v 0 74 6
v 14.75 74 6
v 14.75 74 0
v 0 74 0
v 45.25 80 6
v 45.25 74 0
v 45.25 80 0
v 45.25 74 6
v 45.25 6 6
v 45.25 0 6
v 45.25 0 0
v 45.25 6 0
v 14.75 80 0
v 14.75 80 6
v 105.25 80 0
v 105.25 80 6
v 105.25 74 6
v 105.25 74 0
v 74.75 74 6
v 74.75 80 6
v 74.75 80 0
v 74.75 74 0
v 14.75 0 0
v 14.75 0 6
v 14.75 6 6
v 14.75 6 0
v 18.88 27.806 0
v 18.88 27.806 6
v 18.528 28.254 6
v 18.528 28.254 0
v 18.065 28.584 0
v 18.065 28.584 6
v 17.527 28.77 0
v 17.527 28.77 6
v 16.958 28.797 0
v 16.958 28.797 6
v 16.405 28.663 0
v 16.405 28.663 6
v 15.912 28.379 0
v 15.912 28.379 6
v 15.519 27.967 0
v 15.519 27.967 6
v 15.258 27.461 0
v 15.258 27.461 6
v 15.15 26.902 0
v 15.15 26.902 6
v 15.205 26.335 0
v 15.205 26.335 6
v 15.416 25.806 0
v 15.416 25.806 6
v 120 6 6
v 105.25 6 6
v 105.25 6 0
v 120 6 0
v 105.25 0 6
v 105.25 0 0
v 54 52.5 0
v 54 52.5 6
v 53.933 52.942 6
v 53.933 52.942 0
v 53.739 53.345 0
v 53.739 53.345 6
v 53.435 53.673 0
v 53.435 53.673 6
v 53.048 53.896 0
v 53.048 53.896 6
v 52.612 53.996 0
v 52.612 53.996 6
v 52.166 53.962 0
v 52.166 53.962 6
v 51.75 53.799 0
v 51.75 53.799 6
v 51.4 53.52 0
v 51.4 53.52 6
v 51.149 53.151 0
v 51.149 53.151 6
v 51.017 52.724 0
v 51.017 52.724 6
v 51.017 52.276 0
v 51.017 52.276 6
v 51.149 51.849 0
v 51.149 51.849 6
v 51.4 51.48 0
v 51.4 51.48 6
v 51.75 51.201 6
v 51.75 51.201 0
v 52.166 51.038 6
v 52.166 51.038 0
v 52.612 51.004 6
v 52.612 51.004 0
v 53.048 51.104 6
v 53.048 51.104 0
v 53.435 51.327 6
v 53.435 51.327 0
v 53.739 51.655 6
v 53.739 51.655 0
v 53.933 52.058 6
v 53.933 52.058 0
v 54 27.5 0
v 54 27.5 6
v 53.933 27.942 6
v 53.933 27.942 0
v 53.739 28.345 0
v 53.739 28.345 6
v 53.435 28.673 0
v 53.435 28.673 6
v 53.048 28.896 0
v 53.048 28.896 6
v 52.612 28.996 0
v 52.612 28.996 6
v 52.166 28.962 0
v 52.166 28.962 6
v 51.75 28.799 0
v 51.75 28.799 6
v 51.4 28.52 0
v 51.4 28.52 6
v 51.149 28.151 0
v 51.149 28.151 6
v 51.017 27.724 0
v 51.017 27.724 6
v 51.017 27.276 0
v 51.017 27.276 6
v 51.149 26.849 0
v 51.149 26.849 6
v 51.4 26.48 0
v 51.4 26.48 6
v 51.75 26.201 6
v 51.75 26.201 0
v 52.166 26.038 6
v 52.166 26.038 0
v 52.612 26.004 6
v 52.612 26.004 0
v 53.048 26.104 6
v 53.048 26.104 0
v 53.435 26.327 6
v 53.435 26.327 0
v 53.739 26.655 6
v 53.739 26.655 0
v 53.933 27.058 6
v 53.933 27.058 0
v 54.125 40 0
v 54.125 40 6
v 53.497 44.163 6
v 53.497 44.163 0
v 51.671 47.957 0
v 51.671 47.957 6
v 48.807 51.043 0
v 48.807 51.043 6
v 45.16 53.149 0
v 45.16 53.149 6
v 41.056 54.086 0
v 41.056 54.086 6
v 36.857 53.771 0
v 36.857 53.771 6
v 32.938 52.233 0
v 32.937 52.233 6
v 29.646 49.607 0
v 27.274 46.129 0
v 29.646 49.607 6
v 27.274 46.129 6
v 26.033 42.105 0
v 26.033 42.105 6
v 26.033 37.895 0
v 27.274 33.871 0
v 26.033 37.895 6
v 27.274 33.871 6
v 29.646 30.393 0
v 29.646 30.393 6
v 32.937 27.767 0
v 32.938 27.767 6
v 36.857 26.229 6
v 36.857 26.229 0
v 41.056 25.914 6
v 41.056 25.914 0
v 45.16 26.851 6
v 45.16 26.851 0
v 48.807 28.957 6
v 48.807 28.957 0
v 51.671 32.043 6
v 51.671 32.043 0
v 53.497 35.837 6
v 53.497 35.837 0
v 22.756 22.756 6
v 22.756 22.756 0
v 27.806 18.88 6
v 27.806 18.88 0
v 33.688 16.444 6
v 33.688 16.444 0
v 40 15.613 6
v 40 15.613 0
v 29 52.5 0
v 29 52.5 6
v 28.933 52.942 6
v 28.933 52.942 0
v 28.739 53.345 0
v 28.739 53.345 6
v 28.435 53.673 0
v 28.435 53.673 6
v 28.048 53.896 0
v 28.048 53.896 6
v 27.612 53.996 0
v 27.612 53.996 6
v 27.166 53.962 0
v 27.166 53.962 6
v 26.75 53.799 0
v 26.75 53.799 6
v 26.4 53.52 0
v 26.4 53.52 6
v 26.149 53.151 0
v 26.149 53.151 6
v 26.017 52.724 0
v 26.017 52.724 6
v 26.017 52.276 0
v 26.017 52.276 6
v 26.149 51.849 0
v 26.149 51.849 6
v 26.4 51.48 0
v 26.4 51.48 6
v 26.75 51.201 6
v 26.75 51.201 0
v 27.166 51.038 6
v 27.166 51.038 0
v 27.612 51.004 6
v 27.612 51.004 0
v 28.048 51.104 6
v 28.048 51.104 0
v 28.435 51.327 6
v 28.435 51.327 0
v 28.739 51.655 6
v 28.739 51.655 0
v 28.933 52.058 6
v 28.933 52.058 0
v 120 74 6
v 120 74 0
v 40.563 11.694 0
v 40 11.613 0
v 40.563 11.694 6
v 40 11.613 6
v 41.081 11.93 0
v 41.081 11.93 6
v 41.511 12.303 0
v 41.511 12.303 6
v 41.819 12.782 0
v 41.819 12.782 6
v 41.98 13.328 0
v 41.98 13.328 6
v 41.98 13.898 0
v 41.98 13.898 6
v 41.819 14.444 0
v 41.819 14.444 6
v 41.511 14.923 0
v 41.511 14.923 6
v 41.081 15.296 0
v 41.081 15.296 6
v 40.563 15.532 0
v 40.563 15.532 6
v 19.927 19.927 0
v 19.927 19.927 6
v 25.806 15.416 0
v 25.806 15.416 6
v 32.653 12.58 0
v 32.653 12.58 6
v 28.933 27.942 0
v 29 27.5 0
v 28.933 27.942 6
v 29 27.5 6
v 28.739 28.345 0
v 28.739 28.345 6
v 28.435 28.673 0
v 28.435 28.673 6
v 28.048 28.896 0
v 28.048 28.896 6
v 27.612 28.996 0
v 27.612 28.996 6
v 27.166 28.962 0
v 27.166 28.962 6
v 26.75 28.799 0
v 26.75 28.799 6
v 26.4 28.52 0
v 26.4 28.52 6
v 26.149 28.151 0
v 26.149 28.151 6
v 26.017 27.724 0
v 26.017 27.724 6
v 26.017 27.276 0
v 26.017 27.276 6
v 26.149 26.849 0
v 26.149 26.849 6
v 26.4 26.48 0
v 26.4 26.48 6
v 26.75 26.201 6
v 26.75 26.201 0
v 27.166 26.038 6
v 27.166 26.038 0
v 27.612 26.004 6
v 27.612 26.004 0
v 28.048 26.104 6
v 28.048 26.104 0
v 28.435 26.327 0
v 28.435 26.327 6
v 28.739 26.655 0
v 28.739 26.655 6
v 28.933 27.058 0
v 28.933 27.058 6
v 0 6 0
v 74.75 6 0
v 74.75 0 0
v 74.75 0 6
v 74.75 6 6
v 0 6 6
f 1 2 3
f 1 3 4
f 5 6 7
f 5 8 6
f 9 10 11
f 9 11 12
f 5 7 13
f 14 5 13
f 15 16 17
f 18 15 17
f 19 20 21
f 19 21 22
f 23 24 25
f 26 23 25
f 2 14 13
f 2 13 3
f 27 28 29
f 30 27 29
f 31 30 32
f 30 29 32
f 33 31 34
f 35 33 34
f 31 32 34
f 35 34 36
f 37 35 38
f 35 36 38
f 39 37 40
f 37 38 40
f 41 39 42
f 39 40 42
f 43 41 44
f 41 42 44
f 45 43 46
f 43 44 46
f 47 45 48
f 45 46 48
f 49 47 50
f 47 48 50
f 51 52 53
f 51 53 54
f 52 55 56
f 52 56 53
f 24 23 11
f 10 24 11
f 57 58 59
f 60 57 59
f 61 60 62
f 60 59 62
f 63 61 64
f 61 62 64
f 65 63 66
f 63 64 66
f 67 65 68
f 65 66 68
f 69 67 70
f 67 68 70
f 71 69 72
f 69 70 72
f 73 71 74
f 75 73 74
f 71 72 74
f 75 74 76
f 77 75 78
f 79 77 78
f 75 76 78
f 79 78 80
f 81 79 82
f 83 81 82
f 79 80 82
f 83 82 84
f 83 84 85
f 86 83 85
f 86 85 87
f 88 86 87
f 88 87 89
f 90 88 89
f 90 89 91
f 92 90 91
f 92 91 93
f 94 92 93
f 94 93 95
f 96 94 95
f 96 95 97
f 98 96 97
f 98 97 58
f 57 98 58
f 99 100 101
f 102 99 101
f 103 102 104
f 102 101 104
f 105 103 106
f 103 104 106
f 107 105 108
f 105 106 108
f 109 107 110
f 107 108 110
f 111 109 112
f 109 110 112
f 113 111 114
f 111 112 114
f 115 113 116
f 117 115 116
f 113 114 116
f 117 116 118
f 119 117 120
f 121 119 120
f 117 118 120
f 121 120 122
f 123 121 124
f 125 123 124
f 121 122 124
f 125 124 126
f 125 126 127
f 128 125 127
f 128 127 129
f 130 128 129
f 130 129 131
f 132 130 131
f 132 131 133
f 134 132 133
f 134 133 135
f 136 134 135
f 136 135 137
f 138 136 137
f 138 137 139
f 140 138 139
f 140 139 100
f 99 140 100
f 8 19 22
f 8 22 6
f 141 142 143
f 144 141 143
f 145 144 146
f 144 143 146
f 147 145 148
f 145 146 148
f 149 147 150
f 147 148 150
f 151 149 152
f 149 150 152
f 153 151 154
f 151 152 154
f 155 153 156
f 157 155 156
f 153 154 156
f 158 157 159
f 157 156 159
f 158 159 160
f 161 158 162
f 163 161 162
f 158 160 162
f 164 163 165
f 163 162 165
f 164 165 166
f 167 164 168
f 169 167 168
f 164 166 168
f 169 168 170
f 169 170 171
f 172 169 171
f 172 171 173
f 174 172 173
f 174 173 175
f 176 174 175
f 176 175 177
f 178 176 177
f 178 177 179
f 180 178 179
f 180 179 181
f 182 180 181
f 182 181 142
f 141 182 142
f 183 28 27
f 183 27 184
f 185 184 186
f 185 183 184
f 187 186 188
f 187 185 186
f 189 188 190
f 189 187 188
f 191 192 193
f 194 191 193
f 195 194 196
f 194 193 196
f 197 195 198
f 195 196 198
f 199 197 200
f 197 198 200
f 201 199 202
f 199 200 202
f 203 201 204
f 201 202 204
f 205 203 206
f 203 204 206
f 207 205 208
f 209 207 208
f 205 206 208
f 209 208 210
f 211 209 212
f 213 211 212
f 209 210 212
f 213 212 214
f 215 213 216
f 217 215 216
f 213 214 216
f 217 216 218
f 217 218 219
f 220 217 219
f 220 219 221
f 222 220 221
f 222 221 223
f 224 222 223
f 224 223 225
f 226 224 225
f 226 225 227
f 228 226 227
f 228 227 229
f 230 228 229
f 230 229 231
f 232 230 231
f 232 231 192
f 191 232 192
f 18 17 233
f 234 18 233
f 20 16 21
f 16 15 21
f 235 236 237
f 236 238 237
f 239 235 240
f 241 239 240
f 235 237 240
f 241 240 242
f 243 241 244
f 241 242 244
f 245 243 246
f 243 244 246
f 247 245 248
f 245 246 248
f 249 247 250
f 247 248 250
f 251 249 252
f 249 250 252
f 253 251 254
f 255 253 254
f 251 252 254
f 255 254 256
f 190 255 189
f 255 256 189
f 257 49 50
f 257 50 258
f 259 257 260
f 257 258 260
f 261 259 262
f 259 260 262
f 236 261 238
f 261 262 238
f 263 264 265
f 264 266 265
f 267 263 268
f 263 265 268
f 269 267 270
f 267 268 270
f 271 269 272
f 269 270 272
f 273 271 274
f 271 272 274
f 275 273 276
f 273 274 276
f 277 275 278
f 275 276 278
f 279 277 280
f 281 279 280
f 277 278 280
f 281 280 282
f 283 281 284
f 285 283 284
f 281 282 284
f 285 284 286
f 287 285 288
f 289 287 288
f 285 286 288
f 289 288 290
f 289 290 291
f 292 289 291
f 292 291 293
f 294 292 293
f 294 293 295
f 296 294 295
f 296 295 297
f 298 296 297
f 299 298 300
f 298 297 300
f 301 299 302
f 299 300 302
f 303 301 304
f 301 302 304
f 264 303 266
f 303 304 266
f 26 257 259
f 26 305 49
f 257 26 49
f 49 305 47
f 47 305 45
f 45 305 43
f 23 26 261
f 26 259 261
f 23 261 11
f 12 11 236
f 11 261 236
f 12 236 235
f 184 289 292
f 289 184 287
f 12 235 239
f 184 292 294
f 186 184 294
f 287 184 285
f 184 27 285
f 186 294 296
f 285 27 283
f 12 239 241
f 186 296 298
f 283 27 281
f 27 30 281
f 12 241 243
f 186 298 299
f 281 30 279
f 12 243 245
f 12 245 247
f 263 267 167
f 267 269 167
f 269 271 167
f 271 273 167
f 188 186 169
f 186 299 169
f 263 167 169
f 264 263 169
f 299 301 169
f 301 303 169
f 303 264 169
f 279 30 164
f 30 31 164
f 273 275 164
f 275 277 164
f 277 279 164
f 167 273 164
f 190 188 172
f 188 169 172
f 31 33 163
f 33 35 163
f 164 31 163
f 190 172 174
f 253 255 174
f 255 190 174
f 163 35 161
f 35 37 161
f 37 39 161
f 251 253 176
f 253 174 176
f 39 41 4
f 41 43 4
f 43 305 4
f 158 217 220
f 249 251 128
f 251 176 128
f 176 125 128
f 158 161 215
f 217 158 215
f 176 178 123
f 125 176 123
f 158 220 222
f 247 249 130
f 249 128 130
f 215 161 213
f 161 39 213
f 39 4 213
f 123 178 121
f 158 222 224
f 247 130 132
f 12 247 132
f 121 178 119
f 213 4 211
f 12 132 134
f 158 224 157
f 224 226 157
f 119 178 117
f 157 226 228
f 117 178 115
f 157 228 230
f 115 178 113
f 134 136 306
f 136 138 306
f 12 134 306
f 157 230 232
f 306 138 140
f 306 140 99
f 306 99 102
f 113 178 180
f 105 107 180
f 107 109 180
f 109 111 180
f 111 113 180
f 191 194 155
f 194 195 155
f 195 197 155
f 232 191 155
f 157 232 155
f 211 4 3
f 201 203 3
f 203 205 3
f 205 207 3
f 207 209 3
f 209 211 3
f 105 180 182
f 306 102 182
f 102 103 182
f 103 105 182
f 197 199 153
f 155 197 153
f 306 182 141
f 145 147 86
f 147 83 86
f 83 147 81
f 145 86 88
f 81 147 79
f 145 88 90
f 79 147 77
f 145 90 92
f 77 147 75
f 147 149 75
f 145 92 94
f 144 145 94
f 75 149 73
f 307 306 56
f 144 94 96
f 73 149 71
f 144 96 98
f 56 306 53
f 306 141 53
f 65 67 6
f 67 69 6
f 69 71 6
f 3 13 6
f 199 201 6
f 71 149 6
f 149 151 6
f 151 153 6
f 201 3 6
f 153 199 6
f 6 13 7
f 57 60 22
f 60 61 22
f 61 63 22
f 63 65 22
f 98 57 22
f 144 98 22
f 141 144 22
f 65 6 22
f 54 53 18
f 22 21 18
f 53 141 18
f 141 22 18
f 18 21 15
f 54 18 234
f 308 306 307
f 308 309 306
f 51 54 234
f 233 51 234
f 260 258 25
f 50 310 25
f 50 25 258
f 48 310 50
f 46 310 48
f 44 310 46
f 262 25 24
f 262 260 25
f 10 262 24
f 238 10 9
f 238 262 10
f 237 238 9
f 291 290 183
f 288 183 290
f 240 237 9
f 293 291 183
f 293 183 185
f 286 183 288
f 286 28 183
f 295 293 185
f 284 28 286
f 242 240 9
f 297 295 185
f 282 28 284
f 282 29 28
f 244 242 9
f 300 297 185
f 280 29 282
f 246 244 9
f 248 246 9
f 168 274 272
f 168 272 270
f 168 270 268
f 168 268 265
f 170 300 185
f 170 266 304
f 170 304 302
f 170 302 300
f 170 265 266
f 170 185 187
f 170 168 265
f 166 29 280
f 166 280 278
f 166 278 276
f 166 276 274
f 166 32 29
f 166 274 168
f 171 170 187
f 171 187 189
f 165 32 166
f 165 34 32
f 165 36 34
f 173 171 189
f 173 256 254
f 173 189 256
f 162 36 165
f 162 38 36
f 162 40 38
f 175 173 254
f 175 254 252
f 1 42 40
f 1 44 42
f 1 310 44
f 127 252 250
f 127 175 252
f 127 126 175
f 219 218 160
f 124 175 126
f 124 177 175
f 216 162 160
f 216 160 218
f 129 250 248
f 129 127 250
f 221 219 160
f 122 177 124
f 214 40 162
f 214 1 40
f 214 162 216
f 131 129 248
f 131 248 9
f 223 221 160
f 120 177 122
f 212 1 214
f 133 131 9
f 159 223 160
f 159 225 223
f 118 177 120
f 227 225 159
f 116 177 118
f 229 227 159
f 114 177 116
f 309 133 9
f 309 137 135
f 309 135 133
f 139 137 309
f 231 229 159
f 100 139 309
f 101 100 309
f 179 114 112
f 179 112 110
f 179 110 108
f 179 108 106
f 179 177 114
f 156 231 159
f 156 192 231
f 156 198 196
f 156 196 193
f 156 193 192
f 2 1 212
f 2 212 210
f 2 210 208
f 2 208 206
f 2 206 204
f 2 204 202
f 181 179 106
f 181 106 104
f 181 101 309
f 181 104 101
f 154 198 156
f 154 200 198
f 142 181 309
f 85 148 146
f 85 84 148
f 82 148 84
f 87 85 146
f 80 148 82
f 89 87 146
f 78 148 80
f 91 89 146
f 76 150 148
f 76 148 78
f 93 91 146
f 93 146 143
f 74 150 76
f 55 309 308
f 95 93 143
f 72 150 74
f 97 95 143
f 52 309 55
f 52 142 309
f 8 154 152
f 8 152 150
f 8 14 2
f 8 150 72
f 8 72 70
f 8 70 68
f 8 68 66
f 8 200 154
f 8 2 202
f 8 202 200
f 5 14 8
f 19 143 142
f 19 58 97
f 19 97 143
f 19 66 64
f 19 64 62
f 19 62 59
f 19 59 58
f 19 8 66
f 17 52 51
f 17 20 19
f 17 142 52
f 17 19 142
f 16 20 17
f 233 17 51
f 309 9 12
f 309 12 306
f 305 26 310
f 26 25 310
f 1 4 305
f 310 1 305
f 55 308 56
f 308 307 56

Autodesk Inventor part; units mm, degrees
ref_plane "YZ Plane" through (0, 0, 0) normal (1, 0, 0) x (0, 1, 0)
ref_plane "XZ Plane" through (0, 0, 0) normal (0, 1, 0) x (-1, 0, 0)
ref_plane "XY Plane" through (0, 0, 0) normal (0, 0, 1) x (1, 0, 0)
sketch "Sketch1" plane through (0, 0, 0) normal (0, 0, 1) x (1, 0, 0)
  line L0 (0, 0) -> (120, 0)
  line L1 (120, 0) -> (120, 80)
  line L2 (120, 80) -> (0, 80)
  line L3 (0, 80) -> (0, 0)
  dimension "d0" = 120
  dimension "d1" = 80
extrude "Extrusion1" add sketch "Sketch1" along normal blind 6
sketch "Sketch2" plane through (0, 0, 6) normal (0, 0, 1) x (1, 0, 0)
  line L0 (0, 0) -> (120, 0) projected
  line L1 (120, 0) -> (120, 80) projected
  line L2 (120, 80) -> (0, 80) projected
  line L3 (0, 80) -> (0, 0) projected
  line L4 (0, 80) -> (14.75, 80)
  line L5 (14.75, 80) -> (14.75, 74)
  line L6 (14.75, 74) -> (0, 74)
  line L7 (0, 74) -> (0, 80)
  line L8 (120, 80) -> (0, 80) projected
  line L9 (45.25, 80) -> (74.75, 80)
  line L10 (74.75, 80) -> (74.75, 74)
  line L11 (74.75, 74) -> (45.25, 74)
  line L12 (45.25, 74) -> (45.25, 80)
  line L13 (120, 80) -> (105.25, 80)
  line L14 (105.25, 80) -> (105.25, 74)
  line L15 (105.25, 74) -> (120, 74)
  line L16 (120, 74) -> (120, 80)
  line L17 (120, 0) -> (105.25, 0)
  line L18 (105.25, 0) -> (105.25, 6)
  line L19 (105.25, 6) -> (120, 6)
  line L20 (120, 6) -> (120, 0)
  line L21 (0, 0) -> (120, 0) projected
  line L22 (74.75, 0) -> (45.25, 0)
  line L23 (45.25, 0) -> (45.25, 6)
  line L24 (45.25, 6) -> (74.75, 6)
  line L25 (74.75, 6) -> (74.75, 0)
  line L26 (0, 0) -> (14.75, 0)
  line L27 (14.75, 0) -> (14.75, 6)
  line L28 (14.75, 6) -> (0, 6)
  line L29 (0, 6) -> (0, 0)
  line L30 (60, 104.1502) -> (60, -33.6862)
  line L31 (120, 0) -> (120, 80) projected
  dimension "d4" = 6
  dimension "d5" = 6
  dimension "d6" = 14.75
  dimension "d7" = 29.5
  dimension "d9" = 14.75
  dimension "d19" = 60
  dimension "d20" = 14.75
extrude "Extrusion2" cut sketch "Sketch2" against normal up to next contours L3 L28 L27 L0 | L23 L24 L30 L0 | L3 L2 L5 L6 | L30 L24 L25 L0 | L18 L19 L1 L0 | L30 L2 L10 L11 | L11 L12 L2 L30 | L15 L14 L2 L1
sketch "Sketch4" plane through (0, 0, 6) normal (0, 0, 1) x (1, 0, 0)
  circle A0 centre (40, 40) radius 4.6
  line L0 (0, 74) -> (0, 6) projected
  line L1 (45.25, 80) -> (14.75, 80) projected
  point P0 (0, 0)
  dimension "d14" = 40
  dimension "d15" = 40
  dimension "d16" = 9.2
extrude "Extrusion4" cut sketch "Sketch4" against normal up to next
sketch "Sketch5" plane through (0, 0, 6) normal (0, 0, 1) x (1, 0, 0)
  circle A0 centre (40, 40) radius 4.6 projected
  line L0 (74.75, 6) -> (74.75, 0) projected
  line L1 (74.75, 0) -> (105.25, 0) projected
  line L2 (105.25, 0) -> (105.25, 6) projected
  line L3 (105.25, 6) -> (120, 6) projected
  line L4 (120, 6) -> (120, 74) projected
  line L5 (120, 74) -> (105.25, 74) projected
  line L6 (105.25, 74) -> (105.25, 80) projected
  line L7 (105.25, 80) -> (74.75, 80) projected
  line L8 (74.75, 80) -> (74.75, 74) projected
  line L9 (74.75, 74) -> (45.25, 74) projected
  line L10 (45.25, 74) -> (45.25, 80) projected
  line L11 (45.25, 80) -> (14.75, 80) projected
  line L12 (14.75, 80) -> (14.75, 74) projected
  line L13 (14.75, 74) -> (0, 74) projected
  line L14 (0, 74) -> (0, 6) projected
  line L15 (0, 6) -> (14.75, 6) projected
  line L16 (14.75, 6) -> (14.75, 0) projected
  line L17 (14.75, 0) -> (45.25, 0) projected
  line L18 (45.25, 0) -> (45.25, 6) projected
  line L19 (45.25, 6) -> (74.75, 6) projected
  line L20 (52.5, 27.5) -> (27.5, 27.5)
  line L21 (27.5, 27.5) -> (27.5, 52.5)
  line L22 (27.5, 52.5) -> (52.5, 52.5)
  line L23 (52.5, 52.5) -> (52.5, 27.5)
  circle A1 centre (40, 40) radius 14.125
  circle A2 centre (52.5, 27.5) radius 1.5
  circle A3 centre (27.5, 27.5) radius 1.5
  circle A4 centre (27.5, 52.5) radius 1.5
  circle A5 centre (52.5, 52.5) radius 1.5
  circle A6 centre (40, 40) radius 26.387 construction
  line L24 (40, 40) -> (40, 13.613) construction
  line L25 (40, 40) -> (17.1482, 26.8065) construction
  arc A7 (40, 11.613) -> (40, 15.613) centre (40, 13.613) ccw
  arc A8 (18.8802, 27.8065) -> (15.4161, 25.8065) centre (17.1482, 26.8065) ccw
  arc A9 (18.8802, 27.8065) -> (40, 15.613) centre (40, 40) ccw
  arc A10 (15.4161, 25.8065) -> (40, 11.613) centre (40, 40) ccw
  point P0 (0, 0)
  dimension "d21" = 3
  dimension "d22" = 3
  dimension "d23" = 3
  dimension "d24" = 3
  dimension "d25" = 28.25
  dimension "d26" = 25
  dimension "d27" = 25
  dimension "d28" = 12.5
  dimension "d29" = 12.5
  dimension "d30" = 52.774
  dimension "d31" = 60
  dimension "d32" = 4
  dimension "d33" = 4
extrude "Extrusion5" cut sketch "Sketch5" against normal blind 10 contours A3 L21 L20 | L20 L21 A3 | A1 L21 L22 L23 L20 | L20 A1 | A1 L21 | A2 L23 L20 | L20 L23 A2 | L23 A1 | A4 L22 L21 | L21 L22 A4 | A1 L22 | A5 L22 L23 | L23 L22 A5 | A10 A8 A9 A7
equation "\"d20\" = 0.5 * d7"
equation "\"d22\" = d21"
equation "\"d23\" = d21"
equation "\"d24\" = d21"
equation "\"d28\" = 0.5 * d26"
equation "\"d29\" = 0.5 * d27"
properties part number "top"
